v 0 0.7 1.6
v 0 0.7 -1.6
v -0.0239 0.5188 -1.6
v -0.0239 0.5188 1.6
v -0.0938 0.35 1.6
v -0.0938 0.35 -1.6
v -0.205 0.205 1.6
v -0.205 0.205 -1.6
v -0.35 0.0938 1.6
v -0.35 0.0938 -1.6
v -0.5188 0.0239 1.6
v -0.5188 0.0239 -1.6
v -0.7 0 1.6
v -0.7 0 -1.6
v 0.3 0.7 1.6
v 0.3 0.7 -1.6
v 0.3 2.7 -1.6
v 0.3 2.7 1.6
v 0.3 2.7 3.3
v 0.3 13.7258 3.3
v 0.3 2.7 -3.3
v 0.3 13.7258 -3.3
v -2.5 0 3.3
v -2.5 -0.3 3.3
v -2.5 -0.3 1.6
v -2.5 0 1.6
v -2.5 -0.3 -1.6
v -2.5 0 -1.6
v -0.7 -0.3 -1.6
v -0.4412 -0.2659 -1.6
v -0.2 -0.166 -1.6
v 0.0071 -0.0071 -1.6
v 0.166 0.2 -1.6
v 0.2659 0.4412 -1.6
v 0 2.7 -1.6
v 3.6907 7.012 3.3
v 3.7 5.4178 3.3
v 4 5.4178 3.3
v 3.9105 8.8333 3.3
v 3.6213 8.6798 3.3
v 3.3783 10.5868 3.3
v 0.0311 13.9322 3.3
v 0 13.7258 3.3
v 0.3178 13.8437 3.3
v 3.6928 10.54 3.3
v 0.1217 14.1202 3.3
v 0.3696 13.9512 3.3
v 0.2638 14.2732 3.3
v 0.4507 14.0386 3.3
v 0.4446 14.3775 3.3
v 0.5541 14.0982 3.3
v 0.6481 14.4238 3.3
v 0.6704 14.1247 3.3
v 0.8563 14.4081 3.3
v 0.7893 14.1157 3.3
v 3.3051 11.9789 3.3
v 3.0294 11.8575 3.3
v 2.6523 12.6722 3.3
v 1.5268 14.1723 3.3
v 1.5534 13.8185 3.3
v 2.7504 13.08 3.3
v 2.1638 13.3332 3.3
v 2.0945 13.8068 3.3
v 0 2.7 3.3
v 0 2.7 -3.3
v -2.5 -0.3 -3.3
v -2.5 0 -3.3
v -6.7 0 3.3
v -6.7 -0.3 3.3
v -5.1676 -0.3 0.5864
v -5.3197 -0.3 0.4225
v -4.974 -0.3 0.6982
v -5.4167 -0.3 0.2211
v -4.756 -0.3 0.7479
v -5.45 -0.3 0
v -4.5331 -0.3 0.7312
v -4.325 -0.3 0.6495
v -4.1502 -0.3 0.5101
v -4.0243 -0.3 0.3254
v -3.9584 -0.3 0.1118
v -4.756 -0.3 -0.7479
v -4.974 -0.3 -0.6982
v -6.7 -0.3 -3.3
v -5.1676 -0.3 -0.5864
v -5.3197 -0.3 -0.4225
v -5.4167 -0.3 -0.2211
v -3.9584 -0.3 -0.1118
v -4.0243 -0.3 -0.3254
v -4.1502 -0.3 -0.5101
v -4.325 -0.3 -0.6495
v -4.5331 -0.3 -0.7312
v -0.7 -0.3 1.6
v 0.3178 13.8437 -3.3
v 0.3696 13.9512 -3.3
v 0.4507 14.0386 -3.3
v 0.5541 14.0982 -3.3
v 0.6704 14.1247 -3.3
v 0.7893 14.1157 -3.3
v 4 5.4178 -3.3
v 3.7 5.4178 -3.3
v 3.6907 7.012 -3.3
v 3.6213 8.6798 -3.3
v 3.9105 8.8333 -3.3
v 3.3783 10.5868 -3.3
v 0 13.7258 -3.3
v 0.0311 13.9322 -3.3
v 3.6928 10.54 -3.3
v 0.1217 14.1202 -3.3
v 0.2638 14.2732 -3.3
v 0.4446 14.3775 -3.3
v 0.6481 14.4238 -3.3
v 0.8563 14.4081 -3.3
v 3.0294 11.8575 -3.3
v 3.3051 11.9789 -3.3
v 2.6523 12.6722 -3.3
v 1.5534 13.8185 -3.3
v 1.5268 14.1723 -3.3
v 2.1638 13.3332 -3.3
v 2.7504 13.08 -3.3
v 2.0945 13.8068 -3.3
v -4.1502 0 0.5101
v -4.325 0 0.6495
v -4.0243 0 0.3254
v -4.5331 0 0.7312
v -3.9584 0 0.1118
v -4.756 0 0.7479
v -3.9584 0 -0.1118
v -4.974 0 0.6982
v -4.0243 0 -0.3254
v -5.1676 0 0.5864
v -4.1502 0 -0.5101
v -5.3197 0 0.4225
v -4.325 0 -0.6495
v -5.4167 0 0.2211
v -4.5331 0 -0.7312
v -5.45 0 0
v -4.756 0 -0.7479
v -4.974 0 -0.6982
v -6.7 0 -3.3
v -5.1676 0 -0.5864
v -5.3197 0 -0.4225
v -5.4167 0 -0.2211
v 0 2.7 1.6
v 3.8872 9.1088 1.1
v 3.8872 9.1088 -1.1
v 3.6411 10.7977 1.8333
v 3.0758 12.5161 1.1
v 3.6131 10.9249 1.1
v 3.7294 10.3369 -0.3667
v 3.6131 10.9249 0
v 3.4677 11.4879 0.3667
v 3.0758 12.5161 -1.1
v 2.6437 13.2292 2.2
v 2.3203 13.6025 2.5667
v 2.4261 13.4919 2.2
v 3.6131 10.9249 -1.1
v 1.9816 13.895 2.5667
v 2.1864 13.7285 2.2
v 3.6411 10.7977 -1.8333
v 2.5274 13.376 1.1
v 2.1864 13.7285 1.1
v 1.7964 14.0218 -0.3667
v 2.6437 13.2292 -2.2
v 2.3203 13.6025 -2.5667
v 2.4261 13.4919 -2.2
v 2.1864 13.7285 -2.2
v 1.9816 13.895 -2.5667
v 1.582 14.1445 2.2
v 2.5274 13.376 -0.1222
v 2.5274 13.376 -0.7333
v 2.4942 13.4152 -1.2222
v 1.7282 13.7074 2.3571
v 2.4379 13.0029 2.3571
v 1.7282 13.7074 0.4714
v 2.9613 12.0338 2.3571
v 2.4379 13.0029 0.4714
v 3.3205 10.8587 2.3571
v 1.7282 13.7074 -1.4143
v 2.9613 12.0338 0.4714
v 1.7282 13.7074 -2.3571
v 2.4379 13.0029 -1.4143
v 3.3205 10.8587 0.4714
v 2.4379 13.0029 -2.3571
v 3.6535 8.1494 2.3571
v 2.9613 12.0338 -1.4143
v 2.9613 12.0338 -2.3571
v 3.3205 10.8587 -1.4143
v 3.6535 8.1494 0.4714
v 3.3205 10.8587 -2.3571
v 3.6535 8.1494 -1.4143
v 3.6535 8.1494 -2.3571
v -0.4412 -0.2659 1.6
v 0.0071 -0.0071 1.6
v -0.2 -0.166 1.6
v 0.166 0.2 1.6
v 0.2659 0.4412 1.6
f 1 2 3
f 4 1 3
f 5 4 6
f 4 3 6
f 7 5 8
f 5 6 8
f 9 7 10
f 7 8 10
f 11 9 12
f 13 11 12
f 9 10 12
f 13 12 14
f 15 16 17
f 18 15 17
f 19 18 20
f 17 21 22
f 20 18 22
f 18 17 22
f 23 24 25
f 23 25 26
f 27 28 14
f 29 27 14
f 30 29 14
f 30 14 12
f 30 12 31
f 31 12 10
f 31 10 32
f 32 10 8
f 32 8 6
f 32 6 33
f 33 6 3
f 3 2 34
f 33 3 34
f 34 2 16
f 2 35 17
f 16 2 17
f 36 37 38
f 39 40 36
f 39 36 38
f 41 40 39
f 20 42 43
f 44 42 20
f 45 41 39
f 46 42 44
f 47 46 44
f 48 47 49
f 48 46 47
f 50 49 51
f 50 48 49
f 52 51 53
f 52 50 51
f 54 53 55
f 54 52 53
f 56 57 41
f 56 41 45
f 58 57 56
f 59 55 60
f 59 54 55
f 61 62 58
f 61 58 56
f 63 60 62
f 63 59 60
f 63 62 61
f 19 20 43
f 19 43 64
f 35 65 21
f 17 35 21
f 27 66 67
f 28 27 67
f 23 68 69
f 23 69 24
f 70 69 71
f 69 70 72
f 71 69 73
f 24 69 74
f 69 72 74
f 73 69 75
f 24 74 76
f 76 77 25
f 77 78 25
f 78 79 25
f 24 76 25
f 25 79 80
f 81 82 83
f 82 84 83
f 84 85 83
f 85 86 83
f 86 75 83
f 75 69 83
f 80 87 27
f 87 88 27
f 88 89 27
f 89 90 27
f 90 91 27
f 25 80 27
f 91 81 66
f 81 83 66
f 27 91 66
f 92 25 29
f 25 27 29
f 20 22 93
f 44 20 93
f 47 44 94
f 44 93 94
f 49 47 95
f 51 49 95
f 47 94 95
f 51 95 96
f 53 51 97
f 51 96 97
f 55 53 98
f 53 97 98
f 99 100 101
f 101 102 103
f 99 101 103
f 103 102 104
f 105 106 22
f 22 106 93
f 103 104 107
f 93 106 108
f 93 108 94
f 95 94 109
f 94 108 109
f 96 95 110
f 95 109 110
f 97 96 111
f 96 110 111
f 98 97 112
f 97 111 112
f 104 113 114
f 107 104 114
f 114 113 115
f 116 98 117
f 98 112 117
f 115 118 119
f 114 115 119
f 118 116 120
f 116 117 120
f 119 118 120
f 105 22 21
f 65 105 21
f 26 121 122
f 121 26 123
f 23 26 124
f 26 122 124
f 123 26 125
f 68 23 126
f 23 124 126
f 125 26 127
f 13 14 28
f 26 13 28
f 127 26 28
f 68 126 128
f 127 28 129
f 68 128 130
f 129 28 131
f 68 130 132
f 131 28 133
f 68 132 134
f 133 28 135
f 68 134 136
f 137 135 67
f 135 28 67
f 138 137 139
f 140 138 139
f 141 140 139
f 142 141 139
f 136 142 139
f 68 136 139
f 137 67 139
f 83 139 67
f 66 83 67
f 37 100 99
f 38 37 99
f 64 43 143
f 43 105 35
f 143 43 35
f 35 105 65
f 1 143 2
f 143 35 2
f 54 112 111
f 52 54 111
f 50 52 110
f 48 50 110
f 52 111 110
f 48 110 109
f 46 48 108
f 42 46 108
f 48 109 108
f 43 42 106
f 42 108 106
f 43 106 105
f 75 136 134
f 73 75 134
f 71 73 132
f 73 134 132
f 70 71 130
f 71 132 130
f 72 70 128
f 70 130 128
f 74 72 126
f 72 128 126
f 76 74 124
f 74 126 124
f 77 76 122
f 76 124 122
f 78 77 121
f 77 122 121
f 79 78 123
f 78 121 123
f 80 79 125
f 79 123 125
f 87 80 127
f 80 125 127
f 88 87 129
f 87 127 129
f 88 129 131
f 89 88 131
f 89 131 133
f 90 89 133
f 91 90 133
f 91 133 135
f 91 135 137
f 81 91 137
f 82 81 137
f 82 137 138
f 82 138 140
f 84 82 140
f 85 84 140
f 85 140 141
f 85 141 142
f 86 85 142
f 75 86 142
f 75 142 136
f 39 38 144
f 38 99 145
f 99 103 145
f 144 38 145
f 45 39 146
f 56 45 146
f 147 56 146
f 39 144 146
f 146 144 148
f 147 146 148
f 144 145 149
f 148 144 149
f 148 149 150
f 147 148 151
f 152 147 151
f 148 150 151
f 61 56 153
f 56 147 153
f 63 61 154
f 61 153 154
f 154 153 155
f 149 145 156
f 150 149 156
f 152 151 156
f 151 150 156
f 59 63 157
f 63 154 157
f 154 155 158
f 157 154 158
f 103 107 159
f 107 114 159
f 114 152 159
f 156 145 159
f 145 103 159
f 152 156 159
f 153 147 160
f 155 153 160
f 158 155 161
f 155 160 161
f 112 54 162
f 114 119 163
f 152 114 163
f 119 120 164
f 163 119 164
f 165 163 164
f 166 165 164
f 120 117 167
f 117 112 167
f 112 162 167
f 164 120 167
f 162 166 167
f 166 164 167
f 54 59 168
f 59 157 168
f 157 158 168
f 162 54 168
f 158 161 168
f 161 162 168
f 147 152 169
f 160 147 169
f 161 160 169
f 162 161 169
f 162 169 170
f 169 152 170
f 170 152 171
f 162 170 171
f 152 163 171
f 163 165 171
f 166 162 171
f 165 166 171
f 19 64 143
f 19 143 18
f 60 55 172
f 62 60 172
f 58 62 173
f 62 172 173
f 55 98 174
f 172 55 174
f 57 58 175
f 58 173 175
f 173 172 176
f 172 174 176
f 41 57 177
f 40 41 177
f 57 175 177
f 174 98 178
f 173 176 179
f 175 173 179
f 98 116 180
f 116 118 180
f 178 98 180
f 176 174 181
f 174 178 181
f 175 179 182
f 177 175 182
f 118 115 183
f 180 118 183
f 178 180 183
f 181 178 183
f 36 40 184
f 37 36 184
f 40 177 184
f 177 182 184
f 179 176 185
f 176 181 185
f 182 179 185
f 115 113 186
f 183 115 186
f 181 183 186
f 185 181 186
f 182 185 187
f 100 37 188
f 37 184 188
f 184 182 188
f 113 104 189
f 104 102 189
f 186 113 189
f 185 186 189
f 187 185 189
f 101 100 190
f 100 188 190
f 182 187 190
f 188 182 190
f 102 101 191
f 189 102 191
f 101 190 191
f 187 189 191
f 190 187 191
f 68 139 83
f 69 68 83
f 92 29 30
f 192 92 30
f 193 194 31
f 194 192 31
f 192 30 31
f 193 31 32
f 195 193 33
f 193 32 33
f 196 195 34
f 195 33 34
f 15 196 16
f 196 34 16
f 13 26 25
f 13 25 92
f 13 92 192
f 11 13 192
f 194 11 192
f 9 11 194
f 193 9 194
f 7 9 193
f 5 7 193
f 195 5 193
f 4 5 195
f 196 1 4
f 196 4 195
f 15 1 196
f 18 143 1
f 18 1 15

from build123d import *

# Parameters (mm, degrees)
BOSS_EXTRUDE1_START = -3.3
BOSS_EXTRUDE1_DEPTH = 6.6
SKETCH2_W           = 3.280173546
SKETCH2_H           = 3.327606579
CUT_EXTRUDE1_DEPTH  = 1.7
SKETCH3_R           = 0.75
CUT_EXTRUDE2_DEPTH  = 17.244469999


# Read off the part's stored shape, not the designer's step: Boss-Extrude1
with BuildPart() as part:
    # Boss-Extrude1 outline → Boss-Extrude1 (new body)
    with BuildSketch(Plane.XY.offset(BOSS_EXTRUDE1_START)):
        with BuildLine():
            Line((-6.7, 0), (-6.7, -0.3))
            Line((-6.7, -0.3), (-0.7, -0.3))
            ThreePointArc((-0.7, -0.3), (0.007106781, -0.007106781), (0.3, 0.7))
            Line((0.3, 0.7), (0.3, 13.725768681))
            ThreePointArc((0.3, 13.725768681), (0.450724342, 14.038597142), (0.789308232, 14.115671283))
            add(Edge.make_bspline(
                [(0.789308232, 14.115671283), (0.961165962, 14.076306812), (1.306452594, 13.962853815), (1.880223168, 13.63882047), (2.704664131, 12.811779549), (3.414638461, 10.952808053), (3.654025925, 8.623480967), (3.700475397, 6.735358197), (3.7, 5.862977701), (3.7, 5.417821782)],
                knots=[0, 0, 0, 0, 0.0625, 0.125, 0.25, 0.5, 0.75, 0.875, 1, 1, 1, 1], degree=3))
            Line((3.7, 5.417821782), (4, 5.417821782))
            add(Edge.make_bspline(
                [(4, 5.417821782), (4, 8.840093463), (4.016269814, 13.684296285), (0.856289406, 14.408098235)],
                knots=[0, 0, 0, 0, 1, 1, 1, 1], degree=3))
            ThreePointArc((0.856289406, 14.408098235), (0.263767599, 14.273218489), (0, 13.725768681))
            Line((0, 13.725768681), (0, 0.7))
            ThreePointArc((0, 0.7), (-0.205025253, 0.205025253), (-0.7, 0))
            Line((-0.7, 0), (-6.7, 0))
        make_face()
    extrude(amount=BOSS_EXTRUDE1_DEPTH)

    # Sketch2 → Cut-Extrude1 (cut)
    with BuildSketch(Plane.XY.offset(3.3)):
        with Locations((-0.859913227, 1.036196711)):
            Rectangle(SKETCH2_W, SKETCH2_H)
    cut_extrude1 = extrude(amount=-CUT_EXTRUDE1_DEPTH, mode=Mode.SUBTRACT)

    # Mirror1: Cut-Extrude1 across plane
    add(cut_extrude1.mirror(Plane.XY), mode=Mode.SUBTRACT)

    # Sketch3 → Cut-Extrude2 (cut, through all)
    with BuildSketch(Plane(origin=(0, 0, 0), x_dir=(1, 0, 0), z_dir=(0, 1, 0))):
        with Locations(Location((-4.7, 0, 0), (0, 0, 180))):
            Circle(SKETCH3_R)
    extrude(amount=-CUT_EXTRUDE2_DEPTH, mode=Mode.SUBTRACT)


solid = part.part
